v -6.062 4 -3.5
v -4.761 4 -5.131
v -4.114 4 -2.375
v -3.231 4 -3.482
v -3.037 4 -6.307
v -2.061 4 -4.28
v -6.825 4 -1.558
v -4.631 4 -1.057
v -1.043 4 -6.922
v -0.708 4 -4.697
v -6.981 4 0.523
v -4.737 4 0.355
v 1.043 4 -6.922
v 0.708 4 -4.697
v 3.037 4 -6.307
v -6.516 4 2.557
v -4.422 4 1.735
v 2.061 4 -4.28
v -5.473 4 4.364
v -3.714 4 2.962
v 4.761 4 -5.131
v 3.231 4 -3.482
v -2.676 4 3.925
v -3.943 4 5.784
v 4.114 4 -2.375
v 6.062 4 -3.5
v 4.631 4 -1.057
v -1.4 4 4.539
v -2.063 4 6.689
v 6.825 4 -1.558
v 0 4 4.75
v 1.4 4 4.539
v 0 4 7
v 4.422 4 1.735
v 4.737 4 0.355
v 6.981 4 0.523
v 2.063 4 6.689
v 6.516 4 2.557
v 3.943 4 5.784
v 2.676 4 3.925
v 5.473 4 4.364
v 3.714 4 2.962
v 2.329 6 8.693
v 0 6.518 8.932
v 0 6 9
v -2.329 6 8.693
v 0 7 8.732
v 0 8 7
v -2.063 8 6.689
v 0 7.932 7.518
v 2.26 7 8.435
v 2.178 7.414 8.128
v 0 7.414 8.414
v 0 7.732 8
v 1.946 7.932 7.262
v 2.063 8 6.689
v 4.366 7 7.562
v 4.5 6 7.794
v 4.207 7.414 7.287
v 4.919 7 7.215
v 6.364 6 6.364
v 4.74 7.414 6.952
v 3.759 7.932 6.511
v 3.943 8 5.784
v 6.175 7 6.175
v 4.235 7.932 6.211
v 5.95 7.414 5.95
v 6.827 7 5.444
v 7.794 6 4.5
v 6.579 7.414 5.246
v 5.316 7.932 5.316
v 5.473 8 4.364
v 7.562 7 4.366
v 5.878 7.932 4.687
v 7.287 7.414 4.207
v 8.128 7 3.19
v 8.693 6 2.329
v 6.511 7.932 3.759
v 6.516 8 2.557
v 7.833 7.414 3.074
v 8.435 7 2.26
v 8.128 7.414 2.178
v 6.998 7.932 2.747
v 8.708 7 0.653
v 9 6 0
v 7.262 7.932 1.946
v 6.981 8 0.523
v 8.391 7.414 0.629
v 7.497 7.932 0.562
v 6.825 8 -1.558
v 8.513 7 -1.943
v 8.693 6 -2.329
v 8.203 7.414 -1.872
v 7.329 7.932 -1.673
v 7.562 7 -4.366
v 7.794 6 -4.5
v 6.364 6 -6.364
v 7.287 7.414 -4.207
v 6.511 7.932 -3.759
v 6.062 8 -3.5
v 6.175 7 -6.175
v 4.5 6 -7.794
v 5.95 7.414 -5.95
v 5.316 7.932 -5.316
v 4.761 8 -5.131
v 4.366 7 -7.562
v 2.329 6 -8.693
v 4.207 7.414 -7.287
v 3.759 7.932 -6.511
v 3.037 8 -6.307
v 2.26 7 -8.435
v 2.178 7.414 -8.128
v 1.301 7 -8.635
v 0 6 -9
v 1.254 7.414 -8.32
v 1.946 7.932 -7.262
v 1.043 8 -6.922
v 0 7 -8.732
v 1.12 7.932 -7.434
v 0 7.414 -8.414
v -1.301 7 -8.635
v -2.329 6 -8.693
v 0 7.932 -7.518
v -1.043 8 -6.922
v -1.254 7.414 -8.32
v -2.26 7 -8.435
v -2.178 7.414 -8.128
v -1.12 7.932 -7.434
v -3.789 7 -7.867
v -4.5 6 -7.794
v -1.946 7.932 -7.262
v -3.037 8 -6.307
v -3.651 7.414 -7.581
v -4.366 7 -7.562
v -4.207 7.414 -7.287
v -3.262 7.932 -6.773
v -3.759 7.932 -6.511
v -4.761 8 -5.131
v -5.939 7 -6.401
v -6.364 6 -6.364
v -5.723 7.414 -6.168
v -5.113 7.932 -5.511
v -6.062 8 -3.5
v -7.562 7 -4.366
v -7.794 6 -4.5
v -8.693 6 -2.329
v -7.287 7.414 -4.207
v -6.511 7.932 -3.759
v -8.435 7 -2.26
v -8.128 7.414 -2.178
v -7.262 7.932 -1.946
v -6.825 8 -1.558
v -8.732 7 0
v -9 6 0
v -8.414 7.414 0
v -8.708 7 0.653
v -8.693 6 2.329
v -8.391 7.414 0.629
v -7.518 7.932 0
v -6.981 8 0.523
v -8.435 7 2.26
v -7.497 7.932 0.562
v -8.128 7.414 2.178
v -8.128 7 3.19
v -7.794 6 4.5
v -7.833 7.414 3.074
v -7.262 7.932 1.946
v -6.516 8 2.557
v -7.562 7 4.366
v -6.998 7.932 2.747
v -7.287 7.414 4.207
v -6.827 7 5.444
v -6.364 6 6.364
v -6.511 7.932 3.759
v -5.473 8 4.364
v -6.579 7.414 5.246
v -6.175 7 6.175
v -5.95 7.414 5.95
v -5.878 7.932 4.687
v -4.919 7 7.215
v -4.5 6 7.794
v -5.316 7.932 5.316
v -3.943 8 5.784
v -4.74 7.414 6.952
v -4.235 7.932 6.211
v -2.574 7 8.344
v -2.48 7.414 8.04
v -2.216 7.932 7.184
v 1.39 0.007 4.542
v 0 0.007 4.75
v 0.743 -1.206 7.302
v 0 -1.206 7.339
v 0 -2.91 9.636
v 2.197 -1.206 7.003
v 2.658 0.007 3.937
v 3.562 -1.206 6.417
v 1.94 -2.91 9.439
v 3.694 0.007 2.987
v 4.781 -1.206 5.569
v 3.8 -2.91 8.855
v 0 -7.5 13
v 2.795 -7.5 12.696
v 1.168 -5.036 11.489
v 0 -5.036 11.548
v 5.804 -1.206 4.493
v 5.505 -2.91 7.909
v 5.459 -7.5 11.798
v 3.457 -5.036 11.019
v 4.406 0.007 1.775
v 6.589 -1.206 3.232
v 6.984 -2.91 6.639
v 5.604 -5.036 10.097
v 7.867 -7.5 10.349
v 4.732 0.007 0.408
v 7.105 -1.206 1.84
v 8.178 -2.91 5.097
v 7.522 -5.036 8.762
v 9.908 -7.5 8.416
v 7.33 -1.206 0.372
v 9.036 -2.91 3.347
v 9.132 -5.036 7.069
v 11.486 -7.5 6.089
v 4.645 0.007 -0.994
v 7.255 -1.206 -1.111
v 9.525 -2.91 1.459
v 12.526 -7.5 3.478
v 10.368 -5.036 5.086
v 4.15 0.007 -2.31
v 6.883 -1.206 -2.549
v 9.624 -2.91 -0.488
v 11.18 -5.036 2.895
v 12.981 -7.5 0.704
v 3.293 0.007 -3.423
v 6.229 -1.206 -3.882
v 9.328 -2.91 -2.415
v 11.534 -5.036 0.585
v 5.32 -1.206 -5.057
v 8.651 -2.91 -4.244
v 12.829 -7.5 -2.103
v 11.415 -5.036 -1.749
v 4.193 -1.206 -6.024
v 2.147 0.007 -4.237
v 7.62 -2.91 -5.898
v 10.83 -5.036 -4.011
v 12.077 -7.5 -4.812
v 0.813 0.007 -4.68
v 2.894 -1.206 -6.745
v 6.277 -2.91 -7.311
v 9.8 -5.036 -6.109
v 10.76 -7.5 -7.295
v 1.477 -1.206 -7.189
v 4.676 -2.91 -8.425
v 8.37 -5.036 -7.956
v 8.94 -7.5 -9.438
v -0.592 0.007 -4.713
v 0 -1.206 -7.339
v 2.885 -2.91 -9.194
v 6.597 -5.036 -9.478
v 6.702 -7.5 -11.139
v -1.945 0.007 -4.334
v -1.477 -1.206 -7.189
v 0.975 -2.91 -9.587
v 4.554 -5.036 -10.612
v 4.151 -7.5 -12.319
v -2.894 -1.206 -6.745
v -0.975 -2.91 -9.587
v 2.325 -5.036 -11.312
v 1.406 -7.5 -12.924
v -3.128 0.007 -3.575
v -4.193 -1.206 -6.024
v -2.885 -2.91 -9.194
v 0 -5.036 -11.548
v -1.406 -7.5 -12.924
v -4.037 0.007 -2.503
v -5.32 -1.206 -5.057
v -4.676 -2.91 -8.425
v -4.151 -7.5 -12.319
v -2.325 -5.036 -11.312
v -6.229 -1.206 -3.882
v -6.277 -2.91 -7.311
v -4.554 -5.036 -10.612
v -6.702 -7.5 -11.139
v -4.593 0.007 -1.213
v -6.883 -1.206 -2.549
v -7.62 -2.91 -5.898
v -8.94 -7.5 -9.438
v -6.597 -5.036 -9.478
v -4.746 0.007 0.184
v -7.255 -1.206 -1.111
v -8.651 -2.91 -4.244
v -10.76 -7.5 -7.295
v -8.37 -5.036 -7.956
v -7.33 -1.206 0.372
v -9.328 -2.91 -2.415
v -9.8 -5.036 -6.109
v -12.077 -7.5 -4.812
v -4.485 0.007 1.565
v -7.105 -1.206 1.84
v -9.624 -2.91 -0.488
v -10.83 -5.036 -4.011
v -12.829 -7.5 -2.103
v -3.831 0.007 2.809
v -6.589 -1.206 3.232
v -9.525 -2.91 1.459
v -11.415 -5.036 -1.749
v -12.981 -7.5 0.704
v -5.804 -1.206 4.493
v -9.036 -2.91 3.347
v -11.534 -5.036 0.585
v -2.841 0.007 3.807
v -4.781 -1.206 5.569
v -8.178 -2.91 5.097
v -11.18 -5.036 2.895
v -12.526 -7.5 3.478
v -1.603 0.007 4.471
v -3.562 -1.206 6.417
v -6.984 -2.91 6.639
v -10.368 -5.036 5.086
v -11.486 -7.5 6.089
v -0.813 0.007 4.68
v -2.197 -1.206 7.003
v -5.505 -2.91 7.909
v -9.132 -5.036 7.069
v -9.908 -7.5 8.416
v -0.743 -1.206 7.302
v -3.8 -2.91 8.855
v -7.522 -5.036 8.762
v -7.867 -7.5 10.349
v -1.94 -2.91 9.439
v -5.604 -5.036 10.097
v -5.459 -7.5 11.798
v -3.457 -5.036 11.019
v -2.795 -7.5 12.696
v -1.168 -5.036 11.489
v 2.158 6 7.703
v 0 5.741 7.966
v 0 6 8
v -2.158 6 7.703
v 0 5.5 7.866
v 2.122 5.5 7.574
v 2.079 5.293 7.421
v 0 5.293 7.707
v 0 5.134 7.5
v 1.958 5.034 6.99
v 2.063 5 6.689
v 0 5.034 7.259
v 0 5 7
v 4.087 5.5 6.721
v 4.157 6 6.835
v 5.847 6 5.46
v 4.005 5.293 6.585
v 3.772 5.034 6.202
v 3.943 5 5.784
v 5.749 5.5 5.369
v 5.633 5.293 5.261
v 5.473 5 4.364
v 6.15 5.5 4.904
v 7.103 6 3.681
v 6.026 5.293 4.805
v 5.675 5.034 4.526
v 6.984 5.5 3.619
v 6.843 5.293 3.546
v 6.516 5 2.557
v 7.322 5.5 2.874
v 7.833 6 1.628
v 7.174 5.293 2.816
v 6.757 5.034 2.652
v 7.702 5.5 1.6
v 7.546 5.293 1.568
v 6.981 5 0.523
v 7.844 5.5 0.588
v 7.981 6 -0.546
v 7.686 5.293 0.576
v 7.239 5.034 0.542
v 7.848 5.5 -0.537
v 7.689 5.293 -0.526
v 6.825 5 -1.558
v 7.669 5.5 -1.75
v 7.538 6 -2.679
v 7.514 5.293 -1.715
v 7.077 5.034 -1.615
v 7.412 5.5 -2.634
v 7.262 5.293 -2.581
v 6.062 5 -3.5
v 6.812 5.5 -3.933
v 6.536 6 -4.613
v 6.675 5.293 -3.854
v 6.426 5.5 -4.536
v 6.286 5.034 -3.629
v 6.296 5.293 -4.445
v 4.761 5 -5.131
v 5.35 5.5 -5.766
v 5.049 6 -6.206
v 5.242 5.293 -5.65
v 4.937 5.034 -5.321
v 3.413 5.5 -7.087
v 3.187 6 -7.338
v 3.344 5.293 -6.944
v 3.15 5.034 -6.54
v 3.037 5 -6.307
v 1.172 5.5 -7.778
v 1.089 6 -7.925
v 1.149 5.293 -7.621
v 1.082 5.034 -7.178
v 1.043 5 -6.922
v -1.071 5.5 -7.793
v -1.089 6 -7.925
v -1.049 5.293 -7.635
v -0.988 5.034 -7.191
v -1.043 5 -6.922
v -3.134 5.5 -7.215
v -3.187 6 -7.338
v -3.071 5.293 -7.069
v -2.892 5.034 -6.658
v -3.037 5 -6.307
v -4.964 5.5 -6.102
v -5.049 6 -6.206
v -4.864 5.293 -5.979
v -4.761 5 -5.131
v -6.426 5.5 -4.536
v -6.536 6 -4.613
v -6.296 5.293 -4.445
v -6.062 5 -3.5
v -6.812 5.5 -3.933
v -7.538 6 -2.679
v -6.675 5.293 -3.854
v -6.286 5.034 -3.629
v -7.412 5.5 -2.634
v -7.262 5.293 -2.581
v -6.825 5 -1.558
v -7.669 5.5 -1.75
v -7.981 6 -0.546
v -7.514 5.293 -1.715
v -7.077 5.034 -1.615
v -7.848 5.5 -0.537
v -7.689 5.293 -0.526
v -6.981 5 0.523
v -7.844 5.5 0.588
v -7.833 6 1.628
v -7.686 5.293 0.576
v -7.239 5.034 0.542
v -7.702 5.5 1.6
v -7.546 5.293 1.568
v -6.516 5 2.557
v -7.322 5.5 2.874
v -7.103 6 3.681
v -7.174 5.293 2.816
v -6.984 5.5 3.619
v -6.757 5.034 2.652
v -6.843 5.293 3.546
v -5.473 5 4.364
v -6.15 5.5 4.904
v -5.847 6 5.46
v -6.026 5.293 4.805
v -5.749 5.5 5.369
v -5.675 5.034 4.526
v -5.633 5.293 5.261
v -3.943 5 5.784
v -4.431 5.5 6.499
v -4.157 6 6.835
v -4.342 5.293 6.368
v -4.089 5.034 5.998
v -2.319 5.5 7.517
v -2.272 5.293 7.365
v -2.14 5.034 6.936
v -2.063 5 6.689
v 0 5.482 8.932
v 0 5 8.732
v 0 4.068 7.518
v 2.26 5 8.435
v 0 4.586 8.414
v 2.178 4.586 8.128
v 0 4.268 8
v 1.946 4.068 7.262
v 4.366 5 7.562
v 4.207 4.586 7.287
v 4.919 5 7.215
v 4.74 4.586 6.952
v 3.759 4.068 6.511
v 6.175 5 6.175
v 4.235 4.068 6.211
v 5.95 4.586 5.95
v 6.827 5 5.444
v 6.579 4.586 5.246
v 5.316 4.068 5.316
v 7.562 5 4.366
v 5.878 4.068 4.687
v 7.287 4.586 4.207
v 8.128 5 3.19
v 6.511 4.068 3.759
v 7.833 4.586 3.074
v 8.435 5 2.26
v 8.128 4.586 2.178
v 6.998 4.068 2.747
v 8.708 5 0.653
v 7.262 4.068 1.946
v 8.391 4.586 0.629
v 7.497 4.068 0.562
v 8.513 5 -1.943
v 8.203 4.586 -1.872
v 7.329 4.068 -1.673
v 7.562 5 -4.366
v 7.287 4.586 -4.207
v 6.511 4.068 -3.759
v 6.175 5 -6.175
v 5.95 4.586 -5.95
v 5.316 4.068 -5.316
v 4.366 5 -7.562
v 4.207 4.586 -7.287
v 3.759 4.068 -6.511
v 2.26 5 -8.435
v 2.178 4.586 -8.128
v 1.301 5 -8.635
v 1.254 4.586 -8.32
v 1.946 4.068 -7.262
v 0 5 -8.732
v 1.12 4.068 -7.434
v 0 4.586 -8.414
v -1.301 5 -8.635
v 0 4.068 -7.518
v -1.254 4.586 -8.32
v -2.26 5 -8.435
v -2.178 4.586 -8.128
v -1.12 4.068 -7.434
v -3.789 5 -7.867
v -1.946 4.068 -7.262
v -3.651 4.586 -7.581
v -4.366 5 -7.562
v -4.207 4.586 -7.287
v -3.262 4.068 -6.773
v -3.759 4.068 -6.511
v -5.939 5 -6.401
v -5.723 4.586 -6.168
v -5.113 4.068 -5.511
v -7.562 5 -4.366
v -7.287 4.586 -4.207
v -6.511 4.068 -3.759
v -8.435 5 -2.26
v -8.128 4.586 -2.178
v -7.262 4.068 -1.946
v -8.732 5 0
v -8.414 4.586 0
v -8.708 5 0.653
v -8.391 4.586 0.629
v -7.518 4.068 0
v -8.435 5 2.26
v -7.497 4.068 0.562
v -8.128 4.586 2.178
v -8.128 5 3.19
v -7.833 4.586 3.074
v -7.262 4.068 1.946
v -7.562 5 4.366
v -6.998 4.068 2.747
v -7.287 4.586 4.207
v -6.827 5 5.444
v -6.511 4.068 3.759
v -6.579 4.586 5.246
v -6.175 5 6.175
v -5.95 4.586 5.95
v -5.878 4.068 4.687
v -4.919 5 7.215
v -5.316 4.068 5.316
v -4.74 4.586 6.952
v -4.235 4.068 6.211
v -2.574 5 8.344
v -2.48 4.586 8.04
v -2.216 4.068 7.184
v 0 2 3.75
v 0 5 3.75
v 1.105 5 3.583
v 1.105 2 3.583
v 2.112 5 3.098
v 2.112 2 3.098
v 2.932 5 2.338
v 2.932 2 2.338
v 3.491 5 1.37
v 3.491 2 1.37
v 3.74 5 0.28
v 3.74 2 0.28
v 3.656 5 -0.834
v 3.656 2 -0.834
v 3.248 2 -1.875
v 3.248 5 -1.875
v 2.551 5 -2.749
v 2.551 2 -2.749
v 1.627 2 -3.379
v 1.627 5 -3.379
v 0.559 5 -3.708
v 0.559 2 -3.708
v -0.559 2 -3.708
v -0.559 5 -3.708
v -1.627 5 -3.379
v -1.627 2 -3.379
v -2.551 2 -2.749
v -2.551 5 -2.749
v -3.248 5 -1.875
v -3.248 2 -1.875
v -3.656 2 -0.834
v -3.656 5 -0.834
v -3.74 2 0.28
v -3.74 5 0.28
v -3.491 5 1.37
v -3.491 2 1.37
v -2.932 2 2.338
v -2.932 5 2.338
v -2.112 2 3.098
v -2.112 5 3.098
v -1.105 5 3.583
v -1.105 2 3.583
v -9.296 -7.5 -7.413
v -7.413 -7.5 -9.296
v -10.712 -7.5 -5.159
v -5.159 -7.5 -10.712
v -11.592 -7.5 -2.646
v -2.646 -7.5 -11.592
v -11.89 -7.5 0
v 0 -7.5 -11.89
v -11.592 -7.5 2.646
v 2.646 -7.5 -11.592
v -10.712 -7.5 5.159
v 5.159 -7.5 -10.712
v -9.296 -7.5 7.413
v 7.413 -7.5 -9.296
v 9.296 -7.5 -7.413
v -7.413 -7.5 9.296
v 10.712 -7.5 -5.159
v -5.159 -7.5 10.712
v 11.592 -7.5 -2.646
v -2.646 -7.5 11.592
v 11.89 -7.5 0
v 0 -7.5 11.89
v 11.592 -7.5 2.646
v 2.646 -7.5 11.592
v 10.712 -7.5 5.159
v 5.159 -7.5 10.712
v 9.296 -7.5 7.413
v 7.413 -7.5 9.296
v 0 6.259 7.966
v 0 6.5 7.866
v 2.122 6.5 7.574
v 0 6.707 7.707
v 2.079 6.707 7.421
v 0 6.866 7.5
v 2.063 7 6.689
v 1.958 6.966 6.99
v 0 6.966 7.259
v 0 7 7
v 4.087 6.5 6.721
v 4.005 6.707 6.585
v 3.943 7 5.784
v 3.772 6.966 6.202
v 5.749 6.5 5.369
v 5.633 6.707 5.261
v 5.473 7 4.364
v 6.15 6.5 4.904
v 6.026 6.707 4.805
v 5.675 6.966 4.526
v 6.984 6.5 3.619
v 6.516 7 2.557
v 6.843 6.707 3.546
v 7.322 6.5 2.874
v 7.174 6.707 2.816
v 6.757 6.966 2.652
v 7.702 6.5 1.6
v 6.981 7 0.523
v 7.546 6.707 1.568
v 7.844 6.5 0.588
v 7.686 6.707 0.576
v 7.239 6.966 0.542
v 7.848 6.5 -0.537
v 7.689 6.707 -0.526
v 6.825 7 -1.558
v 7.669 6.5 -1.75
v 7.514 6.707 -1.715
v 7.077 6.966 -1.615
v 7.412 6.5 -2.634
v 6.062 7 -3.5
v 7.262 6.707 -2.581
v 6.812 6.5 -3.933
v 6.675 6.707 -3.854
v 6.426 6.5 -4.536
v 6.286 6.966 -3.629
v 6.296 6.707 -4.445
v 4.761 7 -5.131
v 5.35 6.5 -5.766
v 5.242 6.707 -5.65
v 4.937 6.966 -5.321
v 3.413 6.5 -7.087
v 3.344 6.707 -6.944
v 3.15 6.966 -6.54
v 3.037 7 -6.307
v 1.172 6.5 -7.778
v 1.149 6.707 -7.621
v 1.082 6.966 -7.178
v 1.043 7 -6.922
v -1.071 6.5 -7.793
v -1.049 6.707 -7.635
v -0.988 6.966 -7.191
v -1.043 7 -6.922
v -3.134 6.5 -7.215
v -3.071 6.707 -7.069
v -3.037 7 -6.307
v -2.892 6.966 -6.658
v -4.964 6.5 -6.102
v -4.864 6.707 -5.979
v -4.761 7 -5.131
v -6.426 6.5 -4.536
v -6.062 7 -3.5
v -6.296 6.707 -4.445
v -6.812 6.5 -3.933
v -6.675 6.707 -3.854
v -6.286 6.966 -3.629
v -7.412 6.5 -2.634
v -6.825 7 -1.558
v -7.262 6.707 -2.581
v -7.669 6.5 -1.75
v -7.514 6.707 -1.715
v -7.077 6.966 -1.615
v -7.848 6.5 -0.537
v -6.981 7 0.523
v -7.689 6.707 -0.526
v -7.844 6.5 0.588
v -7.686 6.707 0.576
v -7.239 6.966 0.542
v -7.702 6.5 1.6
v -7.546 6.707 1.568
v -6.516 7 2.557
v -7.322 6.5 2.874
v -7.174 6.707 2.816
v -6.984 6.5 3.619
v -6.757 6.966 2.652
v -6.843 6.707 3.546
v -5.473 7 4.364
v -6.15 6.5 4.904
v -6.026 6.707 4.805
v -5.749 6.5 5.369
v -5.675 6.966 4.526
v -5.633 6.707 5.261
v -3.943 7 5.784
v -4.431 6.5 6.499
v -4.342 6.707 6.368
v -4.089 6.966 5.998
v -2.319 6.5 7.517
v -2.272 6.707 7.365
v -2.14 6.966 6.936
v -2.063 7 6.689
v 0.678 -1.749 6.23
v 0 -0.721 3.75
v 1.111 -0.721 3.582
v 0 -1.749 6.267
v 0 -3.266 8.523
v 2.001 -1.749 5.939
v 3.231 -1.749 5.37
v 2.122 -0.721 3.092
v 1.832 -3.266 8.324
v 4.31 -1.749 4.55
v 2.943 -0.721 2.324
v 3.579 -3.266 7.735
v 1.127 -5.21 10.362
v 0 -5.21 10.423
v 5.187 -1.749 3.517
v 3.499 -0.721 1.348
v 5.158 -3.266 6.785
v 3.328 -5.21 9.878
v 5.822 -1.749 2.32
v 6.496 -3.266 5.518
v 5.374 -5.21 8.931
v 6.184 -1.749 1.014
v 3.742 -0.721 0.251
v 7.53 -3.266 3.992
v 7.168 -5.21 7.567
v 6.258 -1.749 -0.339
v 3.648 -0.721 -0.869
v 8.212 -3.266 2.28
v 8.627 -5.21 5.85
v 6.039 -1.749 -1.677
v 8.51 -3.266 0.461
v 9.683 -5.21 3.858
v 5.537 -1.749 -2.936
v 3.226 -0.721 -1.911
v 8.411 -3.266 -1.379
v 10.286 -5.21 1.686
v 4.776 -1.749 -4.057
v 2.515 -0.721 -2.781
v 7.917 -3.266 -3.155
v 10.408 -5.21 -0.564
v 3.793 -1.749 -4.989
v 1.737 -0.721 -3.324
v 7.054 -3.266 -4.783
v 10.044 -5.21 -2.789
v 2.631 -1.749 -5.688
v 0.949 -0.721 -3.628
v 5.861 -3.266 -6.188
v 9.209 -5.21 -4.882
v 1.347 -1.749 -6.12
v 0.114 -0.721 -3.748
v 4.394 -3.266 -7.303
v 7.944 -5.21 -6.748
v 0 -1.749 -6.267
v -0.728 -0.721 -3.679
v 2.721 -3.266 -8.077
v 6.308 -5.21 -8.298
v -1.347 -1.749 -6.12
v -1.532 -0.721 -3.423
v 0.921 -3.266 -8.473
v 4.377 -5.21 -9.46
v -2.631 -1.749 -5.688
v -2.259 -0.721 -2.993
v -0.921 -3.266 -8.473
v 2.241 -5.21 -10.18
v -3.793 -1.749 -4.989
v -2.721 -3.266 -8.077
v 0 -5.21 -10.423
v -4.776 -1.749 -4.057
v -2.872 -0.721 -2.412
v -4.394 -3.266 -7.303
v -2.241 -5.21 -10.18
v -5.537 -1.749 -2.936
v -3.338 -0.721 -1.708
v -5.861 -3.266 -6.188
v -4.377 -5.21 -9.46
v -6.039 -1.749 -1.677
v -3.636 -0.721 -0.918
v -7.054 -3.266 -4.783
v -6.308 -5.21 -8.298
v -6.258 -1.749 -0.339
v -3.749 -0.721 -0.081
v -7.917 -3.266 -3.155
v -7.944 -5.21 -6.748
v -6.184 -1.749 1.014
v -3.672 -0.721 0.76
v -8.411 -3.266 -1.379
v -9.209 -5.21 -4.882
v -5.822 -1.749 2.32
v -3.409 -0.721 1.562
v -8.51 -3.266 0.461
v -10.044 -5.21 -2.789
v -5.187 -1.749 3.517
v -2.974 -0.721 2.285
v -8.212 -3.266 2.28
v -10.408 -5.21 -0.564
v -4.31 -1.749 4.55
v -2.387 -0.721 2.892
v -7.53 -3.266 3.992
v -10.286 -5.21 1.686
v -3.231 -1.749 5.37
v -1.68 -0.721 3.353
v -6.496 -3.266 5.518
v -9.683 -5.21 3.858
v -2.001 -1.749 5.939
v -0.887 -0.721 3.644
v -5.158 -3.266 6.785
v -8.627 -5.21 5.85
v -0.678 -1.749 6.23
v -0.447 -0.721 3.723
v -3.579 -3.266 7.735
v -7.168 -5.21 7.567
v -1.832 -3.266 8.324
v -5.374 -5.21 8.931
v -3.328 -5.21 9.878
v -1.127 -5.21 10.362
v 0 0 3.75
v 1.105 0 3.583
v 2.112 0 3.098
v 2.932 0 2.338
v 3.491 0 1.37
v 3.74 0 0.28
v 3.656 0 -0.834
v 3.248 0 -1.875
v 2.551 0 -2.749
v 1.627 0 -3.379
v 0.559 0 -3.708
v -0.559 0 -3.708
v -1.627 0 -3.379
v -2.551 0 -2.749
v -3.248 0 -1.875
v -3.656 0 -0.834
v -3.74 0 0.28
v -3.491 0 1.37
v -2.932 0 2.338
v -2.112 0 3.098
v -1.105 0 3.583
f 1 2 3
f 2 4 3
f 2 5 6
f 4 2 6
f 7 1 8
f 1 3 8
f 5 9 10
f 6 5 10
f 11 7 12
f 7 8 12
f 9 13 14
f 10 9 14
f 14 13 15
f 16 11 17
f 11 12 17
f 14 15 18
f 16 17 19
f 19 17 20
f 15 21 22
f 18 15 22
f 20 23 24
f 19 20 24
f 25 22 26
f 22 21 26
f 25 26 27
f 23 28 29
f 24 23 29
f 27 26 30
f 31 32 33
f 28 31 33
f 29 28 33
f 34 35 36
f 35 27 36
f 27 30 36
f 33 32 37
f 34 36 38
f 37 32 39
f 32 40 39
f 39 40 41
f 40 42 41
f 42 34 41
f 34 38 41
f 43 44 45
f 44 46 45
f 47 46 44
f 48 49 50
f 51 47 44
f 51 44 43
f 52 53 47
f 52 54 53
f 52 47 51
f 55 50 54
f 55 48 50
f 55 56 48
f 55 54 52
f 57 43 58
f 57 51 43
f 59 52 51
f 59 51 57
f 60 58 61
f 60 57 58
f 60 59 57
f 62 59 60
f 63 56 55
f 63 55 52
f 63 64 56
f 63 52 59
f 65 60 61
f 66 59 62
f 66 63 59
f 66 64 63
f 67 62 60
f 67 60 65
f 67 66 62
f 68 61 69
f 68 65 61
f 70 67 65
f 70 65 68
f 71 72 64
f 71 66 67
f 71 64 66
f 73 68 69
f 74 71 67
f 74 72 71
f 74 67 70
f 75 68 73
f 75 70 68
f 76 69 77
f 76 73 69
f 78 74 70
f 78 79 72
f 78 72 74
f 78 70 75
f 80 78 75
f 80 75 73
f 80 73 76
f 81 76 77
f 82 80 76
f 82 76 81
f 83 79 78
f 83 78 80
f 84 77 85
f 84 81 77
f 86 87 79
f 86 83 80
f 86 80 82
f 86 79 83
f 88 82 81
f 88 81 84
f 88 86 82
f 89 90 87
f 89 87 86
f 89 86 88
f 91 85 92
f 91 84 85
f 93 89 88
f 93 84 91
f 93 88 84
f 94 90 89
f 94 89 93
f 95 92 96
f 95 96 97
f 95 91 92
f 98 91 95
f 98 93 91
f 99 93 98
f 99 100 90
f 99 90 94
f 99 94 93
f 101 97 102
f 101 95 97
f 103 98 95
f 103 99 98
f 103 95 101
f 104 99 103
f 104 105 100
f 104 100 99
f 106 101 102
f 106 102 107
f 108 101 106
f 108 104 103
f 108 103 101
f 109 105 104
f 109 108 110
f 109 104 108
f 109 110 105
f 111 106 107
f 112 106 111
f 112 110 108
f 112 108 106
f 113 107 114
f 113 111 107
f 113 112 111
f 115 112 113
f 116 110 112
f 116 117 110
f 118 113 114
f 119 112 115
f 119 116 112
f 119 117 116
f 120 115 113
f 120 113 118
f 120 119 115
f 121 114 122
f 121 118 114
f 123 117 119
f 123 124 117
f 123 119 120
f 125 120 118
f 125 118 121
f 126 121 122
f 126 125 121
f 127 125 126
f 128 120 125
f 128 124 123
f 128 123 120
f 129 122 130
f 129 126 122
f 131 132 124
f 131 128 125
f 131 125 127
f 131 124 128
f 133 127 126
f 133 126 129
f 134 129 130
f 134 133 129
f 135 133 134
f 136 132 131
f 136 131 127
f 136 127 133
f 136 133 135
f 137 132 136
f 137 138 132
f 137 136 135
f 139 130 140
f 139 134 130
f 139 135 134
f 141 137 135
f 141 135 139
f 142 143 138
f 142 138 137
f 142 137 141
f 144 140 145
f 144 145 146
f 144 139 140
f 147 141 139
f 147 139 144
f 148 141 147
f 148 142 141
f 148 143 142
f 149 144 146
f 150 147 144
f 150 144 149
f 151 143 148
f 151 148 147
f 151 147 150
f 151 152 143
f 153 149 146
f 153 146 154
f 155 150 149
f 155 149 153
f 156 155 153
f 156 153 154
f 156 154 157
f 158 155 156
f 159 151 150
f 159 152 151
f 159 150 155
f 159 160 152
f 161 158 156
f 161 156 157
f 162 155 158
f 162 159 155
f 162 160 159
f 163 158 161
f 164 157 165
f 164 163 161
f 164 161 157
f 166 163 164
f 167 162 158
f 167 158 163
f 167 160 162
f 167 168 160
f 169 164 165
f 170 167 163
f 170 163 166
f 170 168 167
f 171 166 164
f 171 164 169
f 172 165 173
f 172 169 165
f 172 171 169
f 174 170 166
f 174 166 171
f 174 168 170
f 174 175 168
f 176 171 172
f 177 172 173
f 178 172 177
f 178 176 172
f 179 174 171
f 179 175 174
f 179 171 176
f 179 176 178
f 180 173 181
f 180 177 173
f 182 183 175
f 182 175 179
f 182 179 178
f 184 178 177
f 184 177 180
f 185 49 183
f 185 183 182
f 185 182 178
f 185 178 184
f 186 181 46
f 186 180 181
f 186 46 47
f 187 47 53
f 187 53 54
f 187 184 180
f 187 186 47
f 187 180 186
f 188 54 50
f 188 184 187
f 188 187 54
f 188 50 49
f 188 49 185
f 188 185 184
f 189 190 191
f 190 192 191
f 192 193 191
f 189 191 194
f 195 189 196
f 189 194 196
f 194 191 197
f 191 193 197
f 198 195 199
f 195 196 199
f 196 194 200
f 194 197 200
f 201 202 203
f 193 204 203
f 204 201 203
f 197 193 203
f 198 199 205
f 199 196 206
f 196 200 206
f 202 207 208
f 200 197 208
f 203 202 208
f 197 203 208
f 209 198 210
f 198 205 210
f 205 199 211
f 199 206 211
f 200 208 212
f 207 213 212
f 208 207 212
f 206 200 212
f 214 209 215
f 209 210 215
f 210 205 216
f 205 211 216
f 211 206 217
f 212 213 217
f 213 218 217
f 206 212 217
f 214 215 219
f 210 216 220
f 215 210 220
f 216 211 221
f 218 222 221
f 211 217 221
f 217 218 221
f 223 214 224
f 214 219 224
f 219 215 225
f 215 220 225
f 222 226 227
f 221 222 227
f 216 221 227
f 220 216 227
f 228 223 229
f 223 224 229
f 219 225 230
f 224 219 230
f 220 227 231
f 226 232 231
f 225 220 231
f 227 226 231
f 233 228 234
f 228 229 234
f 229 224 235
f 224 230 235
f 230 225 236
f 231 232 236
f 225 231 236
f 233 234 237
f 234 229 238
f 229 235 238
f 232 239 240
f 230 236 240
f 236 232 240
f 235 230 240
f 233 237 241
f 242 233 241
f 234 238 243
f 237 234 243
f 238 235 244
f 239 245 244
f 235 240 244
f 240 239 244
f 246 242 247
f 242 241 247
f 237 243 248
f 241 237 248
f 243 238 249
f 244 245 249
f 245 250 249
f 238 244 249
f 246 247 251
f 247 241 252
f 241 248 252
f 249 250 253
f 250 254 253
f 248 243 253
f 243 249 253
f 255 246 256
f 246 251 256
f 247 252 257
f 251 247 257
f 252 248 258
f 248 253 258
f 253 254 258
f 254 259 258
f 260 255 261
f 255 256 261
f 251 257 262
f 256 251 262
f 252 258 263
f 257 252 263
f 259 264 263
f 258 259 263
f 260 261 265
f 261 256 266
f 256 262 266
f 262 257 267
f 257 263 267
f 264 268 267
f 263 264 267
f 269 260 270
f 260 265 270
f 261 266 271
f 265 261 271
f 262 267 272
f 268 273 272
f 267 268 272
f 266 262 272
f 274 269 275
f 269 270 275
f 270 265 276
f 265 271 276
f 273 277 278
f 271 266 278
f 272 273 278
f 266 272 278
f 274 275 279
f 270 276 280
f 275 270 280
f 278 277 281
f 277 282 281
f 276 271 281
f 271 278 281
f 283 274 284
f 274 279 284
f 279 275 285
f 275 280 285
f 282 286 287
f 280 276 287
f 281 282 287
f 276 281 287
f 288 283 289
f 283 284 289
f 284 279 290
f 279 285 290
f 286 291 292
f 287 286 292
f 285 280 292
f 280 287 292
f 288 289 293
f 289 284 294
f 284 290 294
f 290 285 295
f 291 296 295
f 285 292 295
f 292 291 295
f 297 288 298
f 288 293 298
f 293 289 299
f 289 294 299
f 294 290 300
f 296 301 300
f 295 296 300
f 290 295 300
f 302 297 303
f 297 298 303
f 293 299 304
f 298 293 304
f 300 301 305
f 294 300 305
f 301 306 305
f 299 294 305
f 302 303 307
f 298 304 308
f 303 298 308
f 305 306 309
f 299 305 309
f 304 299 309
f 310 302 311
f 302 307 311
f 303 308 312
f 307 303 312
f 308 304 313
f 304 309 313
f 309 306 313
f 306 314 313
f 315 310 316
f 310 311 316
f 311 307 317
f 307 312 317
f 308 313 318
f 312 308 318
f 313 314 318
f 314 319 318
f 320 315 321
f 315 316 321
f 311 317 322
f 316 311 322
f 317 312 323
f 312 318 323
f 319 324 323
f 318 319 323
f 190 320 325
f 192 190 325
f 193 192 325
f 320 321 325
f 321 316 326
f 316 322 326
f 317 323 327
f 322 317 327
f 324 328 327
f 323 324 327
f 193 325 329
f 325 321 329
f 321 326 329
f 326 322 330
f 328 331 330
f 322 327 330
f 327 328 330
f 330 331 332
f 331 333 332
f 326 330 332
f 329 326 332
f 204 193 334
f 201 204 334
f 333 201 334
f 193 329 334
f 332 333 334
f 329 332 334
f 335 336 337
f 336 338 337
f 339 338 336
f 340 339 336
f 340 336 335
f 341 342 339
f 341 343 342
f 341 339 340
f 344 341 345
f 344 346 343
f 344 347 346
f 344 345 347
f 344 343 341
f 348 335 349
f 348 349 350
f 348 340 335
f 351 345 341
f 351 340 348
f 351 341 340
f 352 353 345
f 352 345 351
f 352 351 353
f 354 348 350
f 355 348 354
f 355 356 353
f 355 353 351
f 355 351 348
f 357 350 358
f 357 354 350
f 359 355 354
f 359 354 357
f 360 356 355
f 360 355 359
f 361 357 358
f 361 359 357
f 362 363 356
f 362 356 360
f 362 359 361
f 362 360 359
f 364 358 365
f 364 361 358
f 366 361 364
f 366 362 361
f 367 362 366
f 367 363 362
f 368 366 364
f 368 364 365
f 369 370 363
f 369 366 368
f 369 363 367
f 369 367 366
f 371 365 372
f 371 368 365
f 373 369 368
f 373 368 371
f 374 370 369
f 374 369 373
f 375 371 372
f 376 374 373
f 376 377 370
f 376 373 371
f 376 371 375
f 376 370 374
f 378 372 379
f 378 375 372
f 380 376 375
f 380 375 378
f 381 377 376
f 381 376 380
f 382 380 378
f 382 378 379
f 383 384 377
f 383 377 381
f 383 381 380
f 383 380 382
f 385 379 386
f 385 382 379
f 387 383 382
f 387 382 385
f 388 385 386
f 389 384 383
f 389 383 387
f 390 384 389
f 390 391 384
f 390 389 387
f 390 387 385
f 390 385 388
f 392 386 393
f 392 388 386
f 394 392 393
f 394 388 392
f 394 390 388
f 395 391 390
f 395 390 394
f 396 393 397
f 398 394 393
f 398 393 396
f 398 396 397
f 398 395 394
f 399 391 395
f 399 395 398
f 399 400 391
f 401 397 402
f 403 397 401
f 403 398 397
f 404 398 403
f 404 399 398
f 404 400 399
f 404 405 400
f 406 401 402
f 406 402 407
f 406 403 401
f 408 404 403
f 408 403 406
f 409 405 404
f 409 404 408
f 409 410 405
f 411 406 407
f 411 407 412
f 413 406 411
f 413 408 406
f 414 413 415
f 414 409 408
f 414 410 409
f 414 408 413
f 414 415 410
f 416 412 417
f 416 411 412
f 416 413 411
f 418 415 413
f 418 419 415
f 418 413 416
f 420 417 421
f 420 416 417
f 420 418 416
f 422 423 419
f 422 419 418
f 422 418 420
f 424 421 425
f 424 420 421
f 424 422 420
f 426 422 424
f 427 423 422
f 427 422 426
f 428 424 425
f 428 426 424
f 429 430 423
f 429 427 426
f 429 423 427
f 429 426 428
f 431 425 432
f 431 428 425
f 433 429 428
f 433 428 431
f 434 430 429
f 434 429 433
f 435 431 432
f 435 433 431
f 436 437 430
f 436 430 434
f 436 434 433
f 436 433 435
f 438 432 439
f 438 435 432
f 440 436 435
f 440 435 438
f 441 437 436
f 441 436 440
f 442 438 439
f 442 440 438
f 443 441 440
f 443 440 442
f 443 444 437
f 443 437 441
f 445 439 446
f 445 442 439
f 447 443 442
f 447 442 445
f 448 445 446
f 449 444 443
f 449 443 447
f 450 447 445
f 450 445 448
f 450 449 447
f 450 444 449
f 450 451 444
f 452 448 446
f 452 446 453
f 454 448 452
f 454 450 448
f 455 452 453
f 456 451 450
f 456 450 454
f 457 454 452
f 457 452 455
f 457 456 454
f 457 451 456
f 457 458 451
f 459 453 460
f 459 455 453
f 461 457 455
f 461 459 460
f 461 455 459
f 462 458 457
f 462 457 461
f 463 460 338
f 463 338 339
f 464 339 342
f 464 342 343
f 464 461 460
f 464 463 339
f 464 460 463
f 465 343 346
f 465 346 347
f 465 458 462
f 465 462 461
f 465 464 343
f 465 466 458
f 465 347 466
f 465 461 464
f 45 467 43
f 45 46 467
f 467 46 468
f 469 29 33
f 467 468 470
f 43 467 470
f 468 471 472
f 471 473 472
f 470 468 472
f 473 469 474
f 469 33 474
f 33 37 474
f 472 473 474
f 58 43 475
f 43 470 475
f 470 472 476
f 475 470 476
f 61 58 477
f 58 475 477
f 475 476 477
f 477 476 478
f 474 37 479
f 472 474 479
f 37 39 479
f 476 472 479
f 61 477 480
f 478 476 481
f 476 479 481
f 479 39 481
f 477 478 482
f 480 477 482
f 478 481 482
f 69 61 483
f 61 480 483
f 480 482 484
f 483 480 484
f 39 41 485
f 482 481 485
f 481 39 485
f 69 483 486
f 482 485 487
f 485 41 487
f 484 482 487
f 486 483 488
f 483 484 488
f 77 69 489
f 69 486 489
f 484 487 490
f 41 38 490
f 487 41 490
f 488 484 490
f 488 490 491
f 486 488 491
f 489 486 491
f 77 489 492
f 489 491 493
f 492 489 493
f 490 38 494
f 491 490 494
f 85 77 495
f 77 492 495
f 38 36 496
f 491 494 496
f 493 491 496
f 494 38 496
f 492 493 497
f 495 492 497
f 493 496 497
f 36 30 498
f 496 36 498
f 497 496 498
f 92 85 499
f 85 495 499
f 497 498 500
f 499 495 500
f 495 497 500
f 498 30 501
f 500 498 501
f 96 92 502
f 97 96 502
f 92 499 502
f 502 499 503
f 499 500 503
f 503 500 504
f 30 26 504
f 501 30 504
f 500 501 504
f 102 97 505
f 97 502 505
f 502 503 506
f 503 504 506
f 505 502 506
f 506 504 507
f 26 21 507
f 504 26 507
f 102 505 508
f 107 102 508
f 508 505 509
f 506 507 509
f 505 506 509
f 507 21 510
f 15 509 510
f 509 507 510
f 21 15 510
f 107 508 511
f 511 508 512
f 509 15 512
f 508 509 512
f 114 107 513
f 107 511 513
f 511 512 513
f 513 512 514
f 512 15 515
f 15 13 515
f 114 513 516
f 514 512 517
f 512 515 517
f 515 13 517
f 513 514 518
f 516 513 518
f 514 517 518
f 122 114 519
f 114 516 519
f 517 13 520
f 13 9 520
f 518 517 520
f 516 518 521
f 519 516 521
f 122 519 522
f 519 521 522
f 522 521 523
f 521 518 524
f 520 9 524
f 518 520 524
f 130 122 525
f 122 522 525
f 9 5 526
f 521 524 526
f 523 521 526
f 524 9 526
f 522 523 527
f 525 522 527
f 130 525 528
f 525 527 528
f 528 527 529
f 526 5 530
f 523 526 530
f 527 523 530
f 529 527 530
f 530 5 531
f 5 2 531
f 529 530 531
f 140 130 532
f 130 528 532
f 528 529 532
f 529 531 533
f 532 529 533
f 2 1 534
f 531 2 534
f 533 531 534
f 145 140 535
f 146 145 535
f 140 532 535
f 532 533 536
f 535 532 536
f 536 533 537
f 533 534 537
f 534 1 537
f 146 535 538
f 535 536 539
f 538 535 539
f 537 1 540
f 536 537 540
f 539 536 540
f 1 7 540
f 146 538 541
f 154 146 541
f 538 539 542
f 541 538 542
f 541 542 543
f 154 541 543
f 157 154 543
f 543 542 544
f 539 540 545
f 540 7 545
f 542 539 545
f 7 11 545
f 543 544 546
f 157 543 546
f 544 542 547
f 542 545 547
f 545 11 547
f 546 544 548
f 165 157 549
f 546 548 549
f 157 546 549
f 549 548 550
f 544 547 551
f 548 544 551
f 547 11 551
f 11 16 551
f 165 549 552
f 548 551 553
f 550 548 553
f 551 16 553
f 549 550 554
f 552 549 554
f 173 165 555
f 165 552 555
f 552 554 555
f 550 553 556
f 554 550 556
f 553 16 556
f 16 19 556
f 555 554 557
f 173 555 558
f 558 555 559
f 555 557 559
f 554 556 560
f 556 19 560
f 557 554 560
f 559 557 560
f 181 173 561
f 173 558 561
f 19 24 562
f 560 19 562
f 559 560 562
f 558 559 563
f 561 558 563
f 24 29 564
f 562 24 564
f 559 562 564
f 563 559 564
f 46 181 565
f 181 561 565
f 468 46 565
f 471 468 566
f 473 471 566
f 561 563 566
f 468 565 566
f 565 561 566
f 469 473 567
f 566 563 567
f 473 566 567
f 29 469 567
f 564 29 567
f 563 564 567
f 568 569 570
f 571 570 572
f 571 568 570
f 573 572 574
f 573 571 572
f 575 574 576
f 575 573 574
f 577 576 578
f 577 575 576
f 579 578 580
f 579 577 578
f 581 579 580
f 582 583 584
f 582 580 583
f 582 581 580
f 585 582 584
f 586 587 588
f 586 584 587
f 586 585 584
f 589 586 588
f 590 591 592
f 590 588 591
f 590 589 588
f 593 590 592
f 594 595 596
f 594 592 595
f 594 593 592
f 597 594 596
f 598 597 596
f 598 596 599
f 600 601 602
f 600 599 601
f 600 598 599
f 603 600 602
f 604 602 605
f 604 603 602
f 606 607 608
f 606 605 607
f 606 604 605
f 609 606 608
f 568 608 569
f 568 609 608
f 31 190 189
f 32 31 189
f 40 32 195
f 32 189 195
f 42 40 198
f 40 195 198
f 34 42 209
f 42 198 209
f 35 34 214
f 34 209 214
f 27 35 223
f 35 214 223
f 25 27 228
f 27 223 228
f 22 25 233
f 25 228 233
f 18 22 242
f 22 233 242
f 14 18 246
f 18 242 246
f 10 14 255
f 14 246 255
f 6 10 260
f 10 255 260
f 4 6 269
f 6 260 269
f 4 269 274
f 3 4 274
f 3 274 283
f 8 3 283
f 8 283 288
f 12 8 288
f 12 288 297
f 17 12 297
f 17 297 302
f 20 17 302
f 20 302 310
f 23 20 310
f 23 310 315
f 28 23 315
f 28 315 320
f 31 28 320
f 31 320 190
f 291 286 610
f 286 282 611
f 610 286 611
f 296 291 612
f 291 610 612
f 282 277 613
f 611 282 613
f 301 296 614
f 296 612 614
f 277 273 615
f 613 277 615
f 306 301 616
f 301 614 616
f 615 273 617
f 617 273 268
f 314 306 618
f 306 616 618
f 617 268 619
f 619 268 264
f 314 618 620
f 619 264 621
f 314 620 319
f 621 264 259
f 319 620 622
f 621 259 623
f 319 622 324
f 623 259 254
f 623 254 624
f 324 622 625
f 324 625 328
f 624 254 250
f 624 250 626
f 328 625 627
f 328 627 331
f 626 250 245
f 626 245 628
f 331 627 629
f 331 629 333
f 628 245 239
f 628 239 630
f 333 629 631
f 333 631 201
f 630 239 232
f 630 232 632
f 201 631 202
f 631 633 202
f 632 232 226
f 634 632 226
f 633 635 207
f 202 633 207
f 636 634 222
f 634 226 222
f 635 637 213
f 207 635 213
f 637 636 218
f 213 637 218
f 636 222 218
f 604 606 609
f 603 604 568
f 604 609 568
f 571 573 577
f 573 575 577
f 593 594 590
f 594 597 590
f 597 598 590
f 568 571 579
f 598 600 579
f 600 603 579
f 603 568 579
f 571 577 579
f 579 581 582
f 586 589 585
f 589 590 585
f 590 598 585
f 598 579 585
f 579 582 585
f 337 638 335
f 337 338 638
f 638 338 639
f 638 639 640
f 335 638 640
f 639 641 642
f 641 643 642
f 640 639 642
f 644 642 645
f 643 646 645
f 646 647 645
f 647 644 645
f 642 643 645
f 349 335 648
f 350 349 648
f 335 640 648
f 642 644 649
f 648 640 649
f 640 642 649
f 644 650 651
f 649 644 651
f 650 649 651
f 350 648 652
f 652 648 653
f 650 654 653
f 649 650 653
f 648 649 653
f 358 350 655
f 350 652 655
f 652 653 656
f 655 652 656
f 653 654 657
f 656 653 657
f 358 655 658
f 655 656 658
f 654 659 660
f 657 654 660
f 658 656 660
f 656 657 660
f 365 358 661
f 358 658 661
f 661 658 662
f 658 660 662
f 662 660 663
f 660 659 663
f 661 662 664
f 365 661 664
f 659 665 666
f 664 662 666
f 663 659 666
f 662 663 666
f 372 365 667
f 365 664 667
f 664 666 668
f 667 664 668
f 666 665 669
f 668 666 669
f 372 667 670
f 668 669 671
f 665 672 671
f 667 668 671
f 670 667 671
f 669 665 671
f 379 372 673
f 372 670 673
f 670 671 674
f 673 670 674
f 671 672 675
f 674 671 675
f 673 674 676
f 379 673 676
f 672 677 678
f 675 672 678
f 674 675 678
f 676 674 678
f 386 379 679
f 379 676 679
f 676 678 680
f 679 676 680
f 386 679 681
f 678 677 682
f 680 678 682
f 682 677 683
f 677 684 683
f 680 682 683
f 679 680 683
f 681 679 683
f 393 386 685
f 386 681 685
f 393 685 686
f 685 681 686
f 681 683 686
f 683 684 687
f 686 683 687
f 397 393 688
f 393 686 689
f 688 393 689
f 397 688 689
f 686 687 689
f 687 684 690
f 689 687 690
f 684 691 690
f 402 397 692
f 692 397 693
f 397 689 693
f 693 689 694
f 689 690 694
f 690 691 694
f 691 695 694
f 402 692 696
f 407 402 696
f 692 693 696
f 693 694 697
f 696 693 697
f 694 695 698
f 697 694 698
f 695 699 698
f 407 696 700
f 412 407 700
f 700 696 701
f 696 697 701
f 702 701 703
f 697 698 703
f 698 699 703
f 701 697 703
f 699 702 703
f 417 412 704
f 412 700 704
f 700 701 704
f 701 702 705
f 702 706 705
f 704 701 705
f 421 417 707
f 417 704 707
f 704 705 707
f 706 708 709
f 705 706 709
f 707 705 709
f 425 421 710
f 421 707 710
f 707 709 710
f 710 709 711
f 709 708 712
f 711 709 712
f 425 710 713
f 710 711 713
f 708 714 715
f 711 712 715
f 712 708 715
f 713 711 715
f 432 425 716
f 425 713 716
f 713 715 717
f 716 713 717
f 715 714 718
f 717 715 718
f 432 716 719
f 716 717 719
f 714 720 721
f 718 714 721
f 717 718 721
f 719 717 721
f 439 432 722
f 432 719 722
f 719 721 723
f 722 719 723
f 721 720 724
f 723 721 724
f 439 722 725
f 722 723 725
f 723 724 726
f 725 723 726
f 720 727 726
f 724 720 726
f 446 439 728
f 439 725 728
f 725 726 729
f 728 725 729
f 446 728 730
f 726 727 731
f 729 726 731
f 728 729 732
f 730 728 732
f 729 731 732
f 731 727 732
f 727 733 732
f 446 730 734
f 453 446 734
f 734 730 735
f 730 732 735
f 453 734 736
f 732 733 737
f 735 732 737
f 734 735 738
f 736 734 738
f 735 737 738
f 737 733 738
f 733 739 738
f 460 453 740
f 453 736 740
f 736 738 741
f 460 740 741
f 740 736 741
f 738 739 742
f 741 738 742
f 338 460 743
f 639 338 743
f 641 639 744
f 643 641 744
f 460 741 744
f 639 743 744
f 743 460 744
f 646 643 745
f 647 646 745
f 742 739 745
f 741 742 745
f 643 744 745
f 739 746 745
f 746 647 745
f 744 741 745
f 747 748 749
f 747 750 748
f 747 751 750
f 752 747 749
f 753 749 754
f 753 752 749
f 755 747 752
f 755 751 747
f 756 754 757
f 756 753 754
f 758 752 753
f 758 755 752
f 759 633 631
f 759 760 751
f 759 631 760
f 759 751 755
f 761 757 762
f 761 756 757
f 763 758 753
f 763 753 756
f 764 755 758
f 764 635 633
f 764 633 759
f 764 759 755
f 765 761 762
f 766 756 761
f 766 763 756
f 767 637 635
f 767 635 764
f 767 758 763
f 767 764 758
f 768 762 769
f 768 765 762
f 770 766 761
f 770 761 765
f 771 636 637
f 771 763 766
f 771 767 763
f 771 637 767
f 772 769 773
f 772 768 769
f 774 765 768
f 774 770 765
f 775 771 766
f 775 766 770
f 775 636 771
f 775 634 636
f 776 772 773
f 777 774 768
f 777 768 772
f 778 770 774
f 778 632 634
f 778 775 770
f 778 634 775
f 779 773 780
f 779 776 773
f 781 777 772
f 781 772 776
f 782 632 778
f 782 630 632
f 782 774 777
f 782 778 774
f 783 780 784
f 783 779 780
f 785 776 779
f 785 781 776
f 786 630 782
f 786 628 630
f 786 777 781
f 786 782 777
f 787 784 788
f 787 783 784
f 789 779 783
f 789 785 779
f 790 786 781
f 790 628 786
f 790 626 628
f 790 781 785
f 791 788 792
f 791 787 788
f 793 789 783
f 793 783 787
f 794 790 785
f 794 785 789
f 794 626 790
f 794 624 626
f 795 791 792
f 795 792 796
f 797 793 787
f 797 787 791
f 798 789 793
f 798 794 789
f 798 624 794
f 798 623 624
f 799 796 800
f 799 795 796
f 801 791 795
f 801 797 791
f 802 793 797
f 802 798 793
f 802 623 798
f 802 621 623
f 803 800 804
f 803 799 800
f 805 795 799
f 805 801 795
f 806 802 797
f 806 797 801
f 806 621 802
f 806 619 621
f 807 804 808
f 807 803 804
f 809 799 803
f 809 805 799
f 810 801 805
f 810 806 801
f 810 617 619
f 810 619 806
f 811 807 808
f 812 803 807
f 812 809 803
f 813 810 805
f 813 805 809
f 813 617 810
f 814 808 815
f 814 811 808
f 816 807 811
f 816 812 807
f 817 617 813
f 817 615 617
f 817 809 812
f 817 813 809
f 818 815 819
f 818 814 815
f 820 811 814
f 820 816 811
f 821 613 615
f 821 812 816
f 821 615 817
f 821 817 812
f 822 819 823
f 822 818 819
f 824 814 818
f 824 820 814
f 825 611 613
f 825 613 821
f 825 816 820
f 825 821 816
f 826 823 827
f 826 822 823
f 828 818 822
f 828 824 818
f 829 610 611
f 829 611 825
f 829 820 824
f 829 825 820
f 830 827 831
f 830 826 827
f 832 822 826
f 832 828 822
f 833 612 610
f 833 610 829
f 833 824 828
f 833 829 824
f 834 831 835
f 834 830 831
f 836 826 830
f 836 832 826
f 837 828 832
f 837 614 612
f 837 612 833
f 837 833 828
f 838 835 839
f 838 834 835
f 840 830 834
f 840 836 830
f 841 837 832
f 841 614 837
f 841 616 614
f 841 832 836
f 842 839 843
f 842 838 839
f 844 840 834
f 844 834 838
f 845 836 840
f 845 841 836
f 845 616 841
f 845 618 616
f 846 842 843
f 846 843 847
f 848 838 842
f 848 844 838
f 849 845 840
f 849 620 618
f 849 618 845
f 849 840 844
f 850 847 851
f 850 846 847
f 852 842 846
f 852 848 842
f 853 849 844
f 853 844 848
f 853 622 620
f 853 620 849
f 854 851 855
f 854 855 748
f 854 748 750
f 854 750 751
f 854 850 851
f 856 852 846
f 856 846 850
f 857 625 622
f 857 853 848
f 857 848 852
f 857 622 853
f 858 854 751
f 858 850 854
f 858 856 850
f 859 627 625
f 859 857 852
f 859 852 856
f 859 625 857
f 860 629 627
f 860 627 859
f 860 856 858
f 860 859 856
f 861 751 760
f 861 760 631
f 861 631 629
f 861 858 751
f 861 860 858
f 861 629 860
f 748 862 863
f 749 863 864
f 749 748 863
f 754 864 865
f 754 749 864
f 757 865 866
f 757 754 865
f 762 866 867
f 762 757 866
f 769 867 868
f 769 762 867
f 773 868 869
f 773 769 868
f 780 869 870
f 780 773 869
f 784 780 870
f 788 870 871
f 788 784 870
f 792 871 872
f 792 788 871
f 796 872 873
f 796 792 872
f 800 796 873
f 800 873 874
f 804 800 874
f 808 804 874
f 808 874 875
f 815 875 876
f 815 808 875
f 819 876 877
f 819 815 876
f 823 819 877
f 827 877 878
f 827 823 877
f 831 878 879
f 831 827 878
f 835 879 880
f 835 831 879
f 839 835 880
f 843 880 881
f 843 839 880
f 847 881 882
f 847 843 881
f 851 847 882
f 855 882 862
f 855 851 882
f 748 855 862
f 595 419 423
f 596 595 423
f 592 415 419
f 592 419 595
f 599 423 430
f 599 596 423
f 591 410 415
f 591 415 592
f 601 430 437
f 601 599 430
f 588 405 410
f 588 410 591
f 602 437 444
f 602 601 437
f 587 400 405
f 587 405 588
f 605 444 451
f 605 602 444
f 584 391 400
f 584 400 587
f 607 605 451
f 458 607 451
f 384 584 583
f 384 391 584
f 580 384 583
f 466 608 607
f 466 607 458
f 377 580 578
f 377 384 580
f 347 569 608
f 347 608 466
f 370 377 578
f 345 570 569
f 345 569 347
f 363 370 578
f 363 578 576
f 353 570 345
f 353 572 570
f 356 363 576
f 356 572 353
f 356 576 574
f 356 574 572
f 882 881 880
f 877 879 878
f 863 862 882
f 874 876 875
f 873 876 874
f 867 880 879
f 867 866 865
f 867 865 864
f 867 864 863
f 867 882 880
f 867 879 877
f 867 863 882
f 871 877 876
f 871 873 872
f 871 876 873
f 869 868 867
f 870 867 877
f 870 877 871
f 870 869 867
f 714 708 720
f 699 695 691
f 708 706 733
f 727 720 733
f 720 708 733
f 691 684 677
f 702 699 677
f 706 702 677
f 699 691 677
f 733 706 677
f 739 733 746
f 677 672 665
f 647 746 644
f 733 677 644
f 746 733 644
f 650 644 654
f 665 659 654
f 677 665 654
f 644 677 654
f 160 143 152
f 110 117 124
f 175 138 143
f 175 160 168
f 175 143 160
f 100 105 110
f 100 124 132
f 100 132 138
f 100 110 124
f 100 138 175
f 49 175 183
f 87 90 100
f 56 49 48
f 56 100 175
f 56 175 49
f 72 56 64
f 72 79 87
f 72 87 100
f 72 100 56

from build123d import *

# Parameters (mm, degrees)
SKETCH1_R           = 4.75
BOSS_EXTRUDE1_DEPTH = 4
SKETCH2_R           = 9
BOSS_EXTRUDE2_DEPTH = 4
FILLET1_R           = 2
SHELL1_T            = -1
SKETCH4_R           = 3.75
BOSS_EXTRUDE4_DEPTH = 2


with BuildPart() as part:
    # Sketch1 → Boss-Extrude1 (new body)
    with BuildSketch(Plane(origin=(0, 0, 0), x_dir=(1, 0, 0), z_dir=(0, 1, 0))):
        with Locations(Location((0, 0, 0), (0, 0, 270))):
            Circle(SKETCH1_R)
    extrude(amount=BOSS_EXTRUDE1_DEPTH)

    # Sketch2 → Boss-Extrude2 (add)
    with BuildSketch(Plane(origin=(0, 4, 0), x_dir=(1, 0, 0), z_dir=(0, 1, 0))):
        with Locations(Location((0, 0, 0), (0, 0, 270))):
            Circle(SKETCH2_R)
    extrude(amount=BOSS_EXTRUDE2_DEPTH)

    # Fillet1
    fillet1_edges = [part.edges().sort_by_distance(p)[0] for p in [
        (0, 4, -9),
        (0, 8, -9),
    ]]
    fillet(fillet1_edges, radius=FILLET1_R - 0.0001)  # a hair under: the kernel refuses the full size

    # Sketch5 → Revolve1 (revolve)
    with BuildSketch(Plane.XY, mode=Mode.PRIVATE) as revolve1_sk:
        with BuildLine():
            Line((0, -7.5), (0, 0.817821063))
            ThreePointArc((0, 0.817821063), (7.716640254, -1.439591085), (13, -7.5))
            Line((13, -7.5), (0, -7.5))
        make_face()
    revolve(revolve1_sk.sketch.rotate(Axis((0, -7.5, 0), (0, 1, 0)), 270), axis=Axis((0, -7.5, 0), (0, 1, 0)))

    # Shell1
    shell1_openings = [part.faces().sort_by_distance(p)[0] for p in [
        (0, -7.5, 0),
    ]]
    offset(amount=SHELL1_T, openings=shell1_openings, kind=Kind.INTERSECTION)

    # Sketch4 → Boss-Extrude4 (add)
    with BuildSketch(Plane(origin=(0, 0, 0), x_dir=(-1, 0, 0), z_dir=(0, -1, 0))):
        with Locations(Location((0, 0, 0), (0, 0, 90))):
            Circle(SKETCH4_R)
    extrude(amount=-BOSS_EXTRUDE4_DEPTH)


solid = part.part
